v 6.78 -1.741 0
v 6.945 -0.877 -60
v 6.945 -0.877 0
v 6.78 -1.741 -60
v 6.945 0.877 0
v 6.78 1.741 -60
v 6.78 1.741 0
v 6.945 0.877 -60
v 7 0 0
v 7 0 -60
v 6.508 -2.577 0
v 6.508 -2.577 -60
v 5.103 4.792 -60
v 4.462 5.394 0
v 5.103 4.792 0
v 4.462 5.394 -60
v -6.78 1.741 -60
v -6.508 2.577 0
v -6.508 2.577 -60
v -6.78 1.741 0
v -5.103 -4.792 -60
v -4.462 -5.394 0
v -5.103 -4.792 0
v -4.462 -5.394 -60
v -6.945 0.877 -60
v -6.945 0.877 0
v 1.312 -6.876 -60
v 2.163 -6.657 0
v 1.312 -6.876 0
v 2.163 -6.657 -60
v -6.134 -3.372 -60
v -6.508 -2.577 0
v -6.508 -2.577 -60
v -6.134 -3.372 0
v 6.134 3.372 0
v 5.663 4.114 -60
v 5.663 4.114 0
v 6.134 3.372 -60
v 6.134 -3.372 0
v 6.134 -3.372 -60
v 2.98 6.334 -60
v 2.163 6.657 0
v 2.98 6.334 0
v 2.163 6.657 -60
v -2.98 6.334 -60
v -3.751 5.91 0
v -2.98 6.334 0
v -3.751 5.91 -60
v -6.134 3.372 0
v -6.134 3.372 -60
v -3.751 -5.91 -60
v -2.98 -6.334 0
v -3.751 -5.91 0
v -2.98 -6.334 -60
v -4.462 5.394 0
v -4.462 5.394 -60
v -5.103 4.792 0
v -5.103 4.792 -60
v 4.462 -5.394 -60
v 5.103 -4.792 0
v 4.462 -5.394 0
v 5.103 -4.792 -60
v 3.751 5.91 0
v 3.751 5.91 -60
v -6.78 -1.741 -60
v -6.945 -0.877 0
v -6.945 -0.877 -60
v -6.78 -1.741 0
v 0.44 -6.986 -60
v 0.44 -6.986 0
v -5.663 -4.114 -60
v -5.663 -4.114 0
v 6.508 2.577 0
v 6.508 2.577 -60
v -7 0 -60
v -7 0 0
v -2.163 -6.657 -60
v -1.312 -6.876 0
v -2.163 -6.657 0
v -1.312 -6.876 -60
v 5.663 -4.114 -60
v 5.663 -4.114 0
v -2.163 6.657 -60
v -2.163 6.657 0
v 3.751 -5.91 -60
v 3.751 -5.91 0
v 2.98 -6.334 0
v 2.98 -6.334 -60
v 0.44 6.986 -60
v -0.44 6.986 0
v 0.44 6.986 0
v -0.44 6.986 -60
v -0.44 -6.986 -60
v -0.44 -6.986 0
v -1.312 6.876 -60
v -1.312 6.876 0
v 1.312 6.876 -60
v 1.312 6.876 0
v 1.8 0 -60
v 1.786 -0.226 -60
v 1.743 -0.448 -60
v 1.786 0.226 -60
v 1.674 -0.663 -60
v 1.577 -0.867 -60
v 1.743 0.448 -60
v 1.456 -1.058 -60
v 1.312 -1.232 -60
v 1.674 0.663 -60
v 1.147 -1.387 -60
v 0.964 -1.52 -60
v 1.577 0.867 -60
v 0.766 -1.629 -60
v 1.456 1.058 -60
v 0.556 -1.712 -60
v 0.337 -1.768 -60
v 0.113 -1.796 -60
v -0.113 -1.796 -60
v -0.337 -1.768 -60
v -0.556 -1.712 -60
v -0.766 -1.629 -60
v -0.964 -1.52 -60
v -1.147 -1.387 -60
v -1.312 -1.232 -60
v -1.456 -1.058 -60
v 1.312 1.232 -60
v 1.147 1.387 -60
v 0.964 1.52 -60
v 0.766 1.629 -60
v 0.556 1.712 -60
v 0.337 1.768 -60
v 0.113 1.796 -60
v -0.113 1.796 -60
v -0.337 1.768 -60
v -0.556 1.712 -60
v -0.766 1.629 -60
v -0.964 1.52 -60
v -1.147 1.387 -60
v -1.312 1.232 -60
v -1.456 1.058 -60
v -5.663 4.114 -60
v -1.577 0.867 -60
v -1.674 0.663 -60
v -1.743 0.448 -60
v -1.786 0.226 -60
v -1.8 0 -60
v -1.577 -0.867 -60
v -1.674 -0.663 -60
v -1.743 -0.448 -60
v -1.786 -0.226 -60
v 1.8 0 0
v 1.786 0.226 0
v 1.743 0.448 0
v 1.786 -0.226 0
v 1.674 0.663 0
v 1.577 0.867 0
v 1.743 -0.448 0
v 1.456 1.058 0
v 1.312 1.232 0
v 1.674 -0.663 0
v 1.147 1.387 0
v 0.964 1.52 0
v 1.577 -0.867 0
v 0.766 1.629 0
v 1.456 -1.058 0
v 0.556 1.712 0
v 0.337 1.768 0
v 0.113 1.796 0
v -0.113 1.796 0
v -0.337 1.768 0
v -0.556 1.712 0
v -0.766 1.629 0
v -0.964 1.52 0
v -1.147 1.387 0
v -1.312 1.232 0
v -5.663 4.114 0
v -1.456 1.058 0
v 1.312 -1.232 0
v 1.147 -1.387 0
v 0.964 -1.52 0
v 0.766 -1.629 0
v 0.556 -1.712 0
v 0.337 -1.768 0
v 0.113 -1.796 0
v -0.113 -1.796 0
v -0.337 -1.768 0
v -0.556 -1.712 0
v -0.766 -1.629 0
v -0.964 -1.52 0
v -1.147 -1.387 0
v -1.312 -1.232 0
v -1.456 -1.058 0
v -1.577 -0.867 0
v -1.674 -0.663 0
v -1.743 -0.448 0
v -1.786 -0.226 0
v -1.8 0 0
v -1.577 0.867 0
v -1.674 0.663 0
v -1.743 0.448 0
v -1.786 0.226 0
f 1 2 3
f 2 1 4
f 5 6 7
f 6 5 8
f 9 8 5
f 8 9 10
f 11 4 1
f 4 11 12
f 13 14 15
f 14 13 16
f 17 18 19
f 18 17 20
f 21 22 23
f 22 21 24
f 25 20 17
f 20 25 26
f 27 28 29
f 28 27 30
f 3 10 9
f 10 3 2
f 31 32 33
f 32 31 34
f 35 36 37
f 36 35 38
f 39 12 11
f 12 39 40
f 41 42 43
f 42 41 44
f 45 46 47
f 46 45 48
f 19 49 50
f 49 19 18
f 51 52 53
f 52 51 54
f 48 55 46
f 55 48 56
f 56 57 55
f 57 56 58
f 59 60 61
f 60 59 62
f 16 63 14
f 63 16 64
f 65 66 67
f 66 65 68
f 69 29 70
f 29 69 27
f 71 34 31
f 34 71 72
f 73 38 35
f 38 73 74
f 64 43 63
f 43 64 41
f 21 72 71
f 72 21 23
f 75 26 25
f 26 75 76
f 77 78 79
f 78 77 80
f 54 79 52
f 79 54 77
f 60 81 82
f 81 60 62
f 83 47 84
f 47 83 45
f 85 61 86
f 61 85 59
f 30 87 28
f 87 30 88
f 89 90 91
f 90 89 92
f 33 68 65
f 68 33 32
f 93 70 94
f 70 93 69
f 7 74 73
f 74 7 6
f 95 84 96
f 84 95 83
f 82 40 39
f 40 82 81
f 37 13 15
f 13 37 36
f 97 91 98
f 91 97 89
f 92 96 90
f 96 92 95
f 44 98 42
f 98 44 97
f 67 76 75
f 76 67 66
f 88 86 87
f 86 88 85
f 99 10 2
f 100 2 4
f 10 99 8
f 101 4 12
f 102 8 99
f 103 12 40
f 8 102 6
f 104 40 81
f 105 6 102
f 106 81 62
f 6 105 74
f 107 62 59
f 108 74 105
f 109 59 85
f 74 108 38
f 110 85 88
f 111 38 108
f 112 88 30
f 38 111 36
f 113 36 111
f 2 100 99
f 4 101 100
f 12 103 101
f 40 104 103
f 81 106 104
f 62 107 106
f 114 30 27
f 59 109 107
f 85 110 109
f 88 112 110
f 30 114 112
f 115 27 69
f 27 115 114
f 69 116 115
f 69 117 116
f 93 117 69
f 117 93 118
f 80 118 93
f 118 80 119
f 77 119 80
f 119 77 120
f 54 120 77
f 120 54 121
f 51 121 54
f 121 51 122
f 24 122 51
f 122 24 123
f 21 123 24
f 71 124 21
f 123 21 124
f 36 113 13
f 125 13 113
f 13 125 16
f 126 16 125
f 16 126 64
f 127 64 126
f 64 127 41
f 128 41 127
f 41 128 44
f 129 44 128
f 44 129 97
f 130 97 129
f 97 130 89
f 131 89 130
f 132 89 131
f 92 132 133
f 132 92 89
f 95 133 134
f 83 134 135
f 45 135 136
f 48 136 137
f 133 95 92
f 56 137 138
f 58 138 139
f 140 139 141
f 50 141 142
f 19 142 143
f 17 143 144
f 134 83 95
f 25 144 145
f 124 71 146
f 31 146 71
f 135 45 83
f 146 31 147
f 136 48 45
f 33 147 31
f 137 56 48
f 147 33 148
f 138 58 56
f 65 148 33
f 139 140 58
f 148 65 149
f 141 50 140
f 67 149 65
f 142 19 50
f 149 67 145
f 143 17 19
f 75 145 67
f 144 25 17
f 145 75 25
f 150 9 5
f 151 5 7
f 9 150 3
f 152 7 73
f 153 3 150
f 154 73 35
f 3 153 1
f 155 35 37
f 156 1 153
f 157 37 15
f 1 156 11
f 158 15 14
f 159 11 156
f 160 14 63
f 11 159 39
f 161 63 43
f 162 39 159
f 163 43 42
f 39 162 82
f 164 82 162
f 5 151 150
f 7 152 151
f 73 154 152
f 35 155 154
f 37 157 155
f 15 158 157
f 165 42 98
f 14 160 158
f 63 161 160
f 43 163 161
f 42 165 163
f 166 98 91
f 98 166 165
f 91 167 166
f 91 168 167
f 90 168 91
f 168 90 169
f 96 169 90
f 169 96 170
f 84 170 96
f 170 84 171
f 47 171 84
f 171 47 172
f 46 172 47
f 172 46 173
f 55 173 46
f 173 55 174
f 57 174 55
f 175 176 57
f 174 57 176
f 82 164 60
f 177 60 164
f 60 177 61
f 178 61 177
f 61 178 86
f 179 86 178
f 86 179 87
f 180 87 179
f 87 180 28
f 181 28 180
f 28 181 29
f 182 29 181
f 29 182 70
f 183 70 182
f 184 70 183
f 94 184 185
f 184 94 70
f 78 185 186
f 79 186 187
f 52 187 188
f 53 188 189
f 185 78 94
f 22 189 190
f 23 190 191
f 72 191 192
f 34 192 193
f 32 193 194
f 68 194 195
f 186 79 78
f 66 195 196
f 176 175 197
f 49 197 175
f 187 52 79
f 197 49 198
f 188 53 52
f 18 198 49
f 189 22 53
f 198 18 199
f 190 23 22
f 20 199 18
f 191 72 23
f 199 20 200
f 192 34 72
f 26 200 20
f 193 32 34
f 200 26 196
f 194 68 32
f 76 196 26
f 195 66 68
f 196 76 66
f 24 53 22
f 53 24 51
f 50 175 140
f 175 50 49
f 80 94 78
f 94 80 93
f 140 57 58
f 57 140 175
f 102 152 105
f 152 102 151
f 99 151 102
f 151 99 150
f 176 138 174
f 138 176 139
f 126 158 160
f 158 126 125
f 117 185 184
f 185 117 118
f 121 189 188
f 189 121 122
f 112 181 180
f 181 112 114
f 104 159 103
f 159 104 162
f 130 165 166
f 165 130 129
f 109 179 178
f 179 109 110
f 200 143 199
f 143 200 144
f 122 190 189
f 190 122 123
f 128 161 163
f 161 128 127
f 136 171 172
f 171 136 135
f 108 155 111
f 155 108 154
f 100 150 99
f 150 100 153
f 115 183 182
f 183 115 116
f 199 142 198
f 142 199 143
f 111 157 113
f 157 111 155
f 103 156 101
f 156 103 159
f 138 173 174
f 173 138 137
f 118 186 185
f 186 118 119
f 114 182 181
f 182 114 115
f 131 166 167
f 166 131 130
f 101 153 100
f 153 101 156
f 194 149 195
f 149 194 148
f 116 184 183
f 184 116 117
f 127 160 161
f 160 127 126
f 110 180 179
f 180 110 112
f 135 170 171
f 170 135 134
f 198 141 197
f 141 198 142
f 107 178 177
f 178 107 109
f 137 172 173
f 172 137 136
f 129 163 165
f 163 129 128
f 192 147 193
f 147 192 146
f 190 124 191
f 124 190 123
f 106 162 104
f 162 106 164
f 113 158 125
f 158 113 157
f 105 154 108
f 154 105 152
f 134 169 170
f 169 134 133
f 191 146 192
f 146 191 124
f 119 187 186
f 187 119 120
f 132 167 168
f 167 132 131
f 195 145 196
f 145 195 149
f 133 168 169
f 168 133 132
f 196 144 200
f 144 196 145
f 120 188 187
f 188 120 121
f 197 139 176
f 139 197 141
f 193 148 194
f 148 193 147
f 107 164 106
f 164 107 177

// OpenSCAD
$fn = 50;


difference() {
	union() {
		translate(v = [0, 0, -60.0000000000]) {
			cylinder(h = 60, r = 7.0000000000);
		}
	}
	union() {
		#translate(v = [0, 0, -60]) {
			cylinder(h = 60, r = 1.8000000000);
		}
	}
}
